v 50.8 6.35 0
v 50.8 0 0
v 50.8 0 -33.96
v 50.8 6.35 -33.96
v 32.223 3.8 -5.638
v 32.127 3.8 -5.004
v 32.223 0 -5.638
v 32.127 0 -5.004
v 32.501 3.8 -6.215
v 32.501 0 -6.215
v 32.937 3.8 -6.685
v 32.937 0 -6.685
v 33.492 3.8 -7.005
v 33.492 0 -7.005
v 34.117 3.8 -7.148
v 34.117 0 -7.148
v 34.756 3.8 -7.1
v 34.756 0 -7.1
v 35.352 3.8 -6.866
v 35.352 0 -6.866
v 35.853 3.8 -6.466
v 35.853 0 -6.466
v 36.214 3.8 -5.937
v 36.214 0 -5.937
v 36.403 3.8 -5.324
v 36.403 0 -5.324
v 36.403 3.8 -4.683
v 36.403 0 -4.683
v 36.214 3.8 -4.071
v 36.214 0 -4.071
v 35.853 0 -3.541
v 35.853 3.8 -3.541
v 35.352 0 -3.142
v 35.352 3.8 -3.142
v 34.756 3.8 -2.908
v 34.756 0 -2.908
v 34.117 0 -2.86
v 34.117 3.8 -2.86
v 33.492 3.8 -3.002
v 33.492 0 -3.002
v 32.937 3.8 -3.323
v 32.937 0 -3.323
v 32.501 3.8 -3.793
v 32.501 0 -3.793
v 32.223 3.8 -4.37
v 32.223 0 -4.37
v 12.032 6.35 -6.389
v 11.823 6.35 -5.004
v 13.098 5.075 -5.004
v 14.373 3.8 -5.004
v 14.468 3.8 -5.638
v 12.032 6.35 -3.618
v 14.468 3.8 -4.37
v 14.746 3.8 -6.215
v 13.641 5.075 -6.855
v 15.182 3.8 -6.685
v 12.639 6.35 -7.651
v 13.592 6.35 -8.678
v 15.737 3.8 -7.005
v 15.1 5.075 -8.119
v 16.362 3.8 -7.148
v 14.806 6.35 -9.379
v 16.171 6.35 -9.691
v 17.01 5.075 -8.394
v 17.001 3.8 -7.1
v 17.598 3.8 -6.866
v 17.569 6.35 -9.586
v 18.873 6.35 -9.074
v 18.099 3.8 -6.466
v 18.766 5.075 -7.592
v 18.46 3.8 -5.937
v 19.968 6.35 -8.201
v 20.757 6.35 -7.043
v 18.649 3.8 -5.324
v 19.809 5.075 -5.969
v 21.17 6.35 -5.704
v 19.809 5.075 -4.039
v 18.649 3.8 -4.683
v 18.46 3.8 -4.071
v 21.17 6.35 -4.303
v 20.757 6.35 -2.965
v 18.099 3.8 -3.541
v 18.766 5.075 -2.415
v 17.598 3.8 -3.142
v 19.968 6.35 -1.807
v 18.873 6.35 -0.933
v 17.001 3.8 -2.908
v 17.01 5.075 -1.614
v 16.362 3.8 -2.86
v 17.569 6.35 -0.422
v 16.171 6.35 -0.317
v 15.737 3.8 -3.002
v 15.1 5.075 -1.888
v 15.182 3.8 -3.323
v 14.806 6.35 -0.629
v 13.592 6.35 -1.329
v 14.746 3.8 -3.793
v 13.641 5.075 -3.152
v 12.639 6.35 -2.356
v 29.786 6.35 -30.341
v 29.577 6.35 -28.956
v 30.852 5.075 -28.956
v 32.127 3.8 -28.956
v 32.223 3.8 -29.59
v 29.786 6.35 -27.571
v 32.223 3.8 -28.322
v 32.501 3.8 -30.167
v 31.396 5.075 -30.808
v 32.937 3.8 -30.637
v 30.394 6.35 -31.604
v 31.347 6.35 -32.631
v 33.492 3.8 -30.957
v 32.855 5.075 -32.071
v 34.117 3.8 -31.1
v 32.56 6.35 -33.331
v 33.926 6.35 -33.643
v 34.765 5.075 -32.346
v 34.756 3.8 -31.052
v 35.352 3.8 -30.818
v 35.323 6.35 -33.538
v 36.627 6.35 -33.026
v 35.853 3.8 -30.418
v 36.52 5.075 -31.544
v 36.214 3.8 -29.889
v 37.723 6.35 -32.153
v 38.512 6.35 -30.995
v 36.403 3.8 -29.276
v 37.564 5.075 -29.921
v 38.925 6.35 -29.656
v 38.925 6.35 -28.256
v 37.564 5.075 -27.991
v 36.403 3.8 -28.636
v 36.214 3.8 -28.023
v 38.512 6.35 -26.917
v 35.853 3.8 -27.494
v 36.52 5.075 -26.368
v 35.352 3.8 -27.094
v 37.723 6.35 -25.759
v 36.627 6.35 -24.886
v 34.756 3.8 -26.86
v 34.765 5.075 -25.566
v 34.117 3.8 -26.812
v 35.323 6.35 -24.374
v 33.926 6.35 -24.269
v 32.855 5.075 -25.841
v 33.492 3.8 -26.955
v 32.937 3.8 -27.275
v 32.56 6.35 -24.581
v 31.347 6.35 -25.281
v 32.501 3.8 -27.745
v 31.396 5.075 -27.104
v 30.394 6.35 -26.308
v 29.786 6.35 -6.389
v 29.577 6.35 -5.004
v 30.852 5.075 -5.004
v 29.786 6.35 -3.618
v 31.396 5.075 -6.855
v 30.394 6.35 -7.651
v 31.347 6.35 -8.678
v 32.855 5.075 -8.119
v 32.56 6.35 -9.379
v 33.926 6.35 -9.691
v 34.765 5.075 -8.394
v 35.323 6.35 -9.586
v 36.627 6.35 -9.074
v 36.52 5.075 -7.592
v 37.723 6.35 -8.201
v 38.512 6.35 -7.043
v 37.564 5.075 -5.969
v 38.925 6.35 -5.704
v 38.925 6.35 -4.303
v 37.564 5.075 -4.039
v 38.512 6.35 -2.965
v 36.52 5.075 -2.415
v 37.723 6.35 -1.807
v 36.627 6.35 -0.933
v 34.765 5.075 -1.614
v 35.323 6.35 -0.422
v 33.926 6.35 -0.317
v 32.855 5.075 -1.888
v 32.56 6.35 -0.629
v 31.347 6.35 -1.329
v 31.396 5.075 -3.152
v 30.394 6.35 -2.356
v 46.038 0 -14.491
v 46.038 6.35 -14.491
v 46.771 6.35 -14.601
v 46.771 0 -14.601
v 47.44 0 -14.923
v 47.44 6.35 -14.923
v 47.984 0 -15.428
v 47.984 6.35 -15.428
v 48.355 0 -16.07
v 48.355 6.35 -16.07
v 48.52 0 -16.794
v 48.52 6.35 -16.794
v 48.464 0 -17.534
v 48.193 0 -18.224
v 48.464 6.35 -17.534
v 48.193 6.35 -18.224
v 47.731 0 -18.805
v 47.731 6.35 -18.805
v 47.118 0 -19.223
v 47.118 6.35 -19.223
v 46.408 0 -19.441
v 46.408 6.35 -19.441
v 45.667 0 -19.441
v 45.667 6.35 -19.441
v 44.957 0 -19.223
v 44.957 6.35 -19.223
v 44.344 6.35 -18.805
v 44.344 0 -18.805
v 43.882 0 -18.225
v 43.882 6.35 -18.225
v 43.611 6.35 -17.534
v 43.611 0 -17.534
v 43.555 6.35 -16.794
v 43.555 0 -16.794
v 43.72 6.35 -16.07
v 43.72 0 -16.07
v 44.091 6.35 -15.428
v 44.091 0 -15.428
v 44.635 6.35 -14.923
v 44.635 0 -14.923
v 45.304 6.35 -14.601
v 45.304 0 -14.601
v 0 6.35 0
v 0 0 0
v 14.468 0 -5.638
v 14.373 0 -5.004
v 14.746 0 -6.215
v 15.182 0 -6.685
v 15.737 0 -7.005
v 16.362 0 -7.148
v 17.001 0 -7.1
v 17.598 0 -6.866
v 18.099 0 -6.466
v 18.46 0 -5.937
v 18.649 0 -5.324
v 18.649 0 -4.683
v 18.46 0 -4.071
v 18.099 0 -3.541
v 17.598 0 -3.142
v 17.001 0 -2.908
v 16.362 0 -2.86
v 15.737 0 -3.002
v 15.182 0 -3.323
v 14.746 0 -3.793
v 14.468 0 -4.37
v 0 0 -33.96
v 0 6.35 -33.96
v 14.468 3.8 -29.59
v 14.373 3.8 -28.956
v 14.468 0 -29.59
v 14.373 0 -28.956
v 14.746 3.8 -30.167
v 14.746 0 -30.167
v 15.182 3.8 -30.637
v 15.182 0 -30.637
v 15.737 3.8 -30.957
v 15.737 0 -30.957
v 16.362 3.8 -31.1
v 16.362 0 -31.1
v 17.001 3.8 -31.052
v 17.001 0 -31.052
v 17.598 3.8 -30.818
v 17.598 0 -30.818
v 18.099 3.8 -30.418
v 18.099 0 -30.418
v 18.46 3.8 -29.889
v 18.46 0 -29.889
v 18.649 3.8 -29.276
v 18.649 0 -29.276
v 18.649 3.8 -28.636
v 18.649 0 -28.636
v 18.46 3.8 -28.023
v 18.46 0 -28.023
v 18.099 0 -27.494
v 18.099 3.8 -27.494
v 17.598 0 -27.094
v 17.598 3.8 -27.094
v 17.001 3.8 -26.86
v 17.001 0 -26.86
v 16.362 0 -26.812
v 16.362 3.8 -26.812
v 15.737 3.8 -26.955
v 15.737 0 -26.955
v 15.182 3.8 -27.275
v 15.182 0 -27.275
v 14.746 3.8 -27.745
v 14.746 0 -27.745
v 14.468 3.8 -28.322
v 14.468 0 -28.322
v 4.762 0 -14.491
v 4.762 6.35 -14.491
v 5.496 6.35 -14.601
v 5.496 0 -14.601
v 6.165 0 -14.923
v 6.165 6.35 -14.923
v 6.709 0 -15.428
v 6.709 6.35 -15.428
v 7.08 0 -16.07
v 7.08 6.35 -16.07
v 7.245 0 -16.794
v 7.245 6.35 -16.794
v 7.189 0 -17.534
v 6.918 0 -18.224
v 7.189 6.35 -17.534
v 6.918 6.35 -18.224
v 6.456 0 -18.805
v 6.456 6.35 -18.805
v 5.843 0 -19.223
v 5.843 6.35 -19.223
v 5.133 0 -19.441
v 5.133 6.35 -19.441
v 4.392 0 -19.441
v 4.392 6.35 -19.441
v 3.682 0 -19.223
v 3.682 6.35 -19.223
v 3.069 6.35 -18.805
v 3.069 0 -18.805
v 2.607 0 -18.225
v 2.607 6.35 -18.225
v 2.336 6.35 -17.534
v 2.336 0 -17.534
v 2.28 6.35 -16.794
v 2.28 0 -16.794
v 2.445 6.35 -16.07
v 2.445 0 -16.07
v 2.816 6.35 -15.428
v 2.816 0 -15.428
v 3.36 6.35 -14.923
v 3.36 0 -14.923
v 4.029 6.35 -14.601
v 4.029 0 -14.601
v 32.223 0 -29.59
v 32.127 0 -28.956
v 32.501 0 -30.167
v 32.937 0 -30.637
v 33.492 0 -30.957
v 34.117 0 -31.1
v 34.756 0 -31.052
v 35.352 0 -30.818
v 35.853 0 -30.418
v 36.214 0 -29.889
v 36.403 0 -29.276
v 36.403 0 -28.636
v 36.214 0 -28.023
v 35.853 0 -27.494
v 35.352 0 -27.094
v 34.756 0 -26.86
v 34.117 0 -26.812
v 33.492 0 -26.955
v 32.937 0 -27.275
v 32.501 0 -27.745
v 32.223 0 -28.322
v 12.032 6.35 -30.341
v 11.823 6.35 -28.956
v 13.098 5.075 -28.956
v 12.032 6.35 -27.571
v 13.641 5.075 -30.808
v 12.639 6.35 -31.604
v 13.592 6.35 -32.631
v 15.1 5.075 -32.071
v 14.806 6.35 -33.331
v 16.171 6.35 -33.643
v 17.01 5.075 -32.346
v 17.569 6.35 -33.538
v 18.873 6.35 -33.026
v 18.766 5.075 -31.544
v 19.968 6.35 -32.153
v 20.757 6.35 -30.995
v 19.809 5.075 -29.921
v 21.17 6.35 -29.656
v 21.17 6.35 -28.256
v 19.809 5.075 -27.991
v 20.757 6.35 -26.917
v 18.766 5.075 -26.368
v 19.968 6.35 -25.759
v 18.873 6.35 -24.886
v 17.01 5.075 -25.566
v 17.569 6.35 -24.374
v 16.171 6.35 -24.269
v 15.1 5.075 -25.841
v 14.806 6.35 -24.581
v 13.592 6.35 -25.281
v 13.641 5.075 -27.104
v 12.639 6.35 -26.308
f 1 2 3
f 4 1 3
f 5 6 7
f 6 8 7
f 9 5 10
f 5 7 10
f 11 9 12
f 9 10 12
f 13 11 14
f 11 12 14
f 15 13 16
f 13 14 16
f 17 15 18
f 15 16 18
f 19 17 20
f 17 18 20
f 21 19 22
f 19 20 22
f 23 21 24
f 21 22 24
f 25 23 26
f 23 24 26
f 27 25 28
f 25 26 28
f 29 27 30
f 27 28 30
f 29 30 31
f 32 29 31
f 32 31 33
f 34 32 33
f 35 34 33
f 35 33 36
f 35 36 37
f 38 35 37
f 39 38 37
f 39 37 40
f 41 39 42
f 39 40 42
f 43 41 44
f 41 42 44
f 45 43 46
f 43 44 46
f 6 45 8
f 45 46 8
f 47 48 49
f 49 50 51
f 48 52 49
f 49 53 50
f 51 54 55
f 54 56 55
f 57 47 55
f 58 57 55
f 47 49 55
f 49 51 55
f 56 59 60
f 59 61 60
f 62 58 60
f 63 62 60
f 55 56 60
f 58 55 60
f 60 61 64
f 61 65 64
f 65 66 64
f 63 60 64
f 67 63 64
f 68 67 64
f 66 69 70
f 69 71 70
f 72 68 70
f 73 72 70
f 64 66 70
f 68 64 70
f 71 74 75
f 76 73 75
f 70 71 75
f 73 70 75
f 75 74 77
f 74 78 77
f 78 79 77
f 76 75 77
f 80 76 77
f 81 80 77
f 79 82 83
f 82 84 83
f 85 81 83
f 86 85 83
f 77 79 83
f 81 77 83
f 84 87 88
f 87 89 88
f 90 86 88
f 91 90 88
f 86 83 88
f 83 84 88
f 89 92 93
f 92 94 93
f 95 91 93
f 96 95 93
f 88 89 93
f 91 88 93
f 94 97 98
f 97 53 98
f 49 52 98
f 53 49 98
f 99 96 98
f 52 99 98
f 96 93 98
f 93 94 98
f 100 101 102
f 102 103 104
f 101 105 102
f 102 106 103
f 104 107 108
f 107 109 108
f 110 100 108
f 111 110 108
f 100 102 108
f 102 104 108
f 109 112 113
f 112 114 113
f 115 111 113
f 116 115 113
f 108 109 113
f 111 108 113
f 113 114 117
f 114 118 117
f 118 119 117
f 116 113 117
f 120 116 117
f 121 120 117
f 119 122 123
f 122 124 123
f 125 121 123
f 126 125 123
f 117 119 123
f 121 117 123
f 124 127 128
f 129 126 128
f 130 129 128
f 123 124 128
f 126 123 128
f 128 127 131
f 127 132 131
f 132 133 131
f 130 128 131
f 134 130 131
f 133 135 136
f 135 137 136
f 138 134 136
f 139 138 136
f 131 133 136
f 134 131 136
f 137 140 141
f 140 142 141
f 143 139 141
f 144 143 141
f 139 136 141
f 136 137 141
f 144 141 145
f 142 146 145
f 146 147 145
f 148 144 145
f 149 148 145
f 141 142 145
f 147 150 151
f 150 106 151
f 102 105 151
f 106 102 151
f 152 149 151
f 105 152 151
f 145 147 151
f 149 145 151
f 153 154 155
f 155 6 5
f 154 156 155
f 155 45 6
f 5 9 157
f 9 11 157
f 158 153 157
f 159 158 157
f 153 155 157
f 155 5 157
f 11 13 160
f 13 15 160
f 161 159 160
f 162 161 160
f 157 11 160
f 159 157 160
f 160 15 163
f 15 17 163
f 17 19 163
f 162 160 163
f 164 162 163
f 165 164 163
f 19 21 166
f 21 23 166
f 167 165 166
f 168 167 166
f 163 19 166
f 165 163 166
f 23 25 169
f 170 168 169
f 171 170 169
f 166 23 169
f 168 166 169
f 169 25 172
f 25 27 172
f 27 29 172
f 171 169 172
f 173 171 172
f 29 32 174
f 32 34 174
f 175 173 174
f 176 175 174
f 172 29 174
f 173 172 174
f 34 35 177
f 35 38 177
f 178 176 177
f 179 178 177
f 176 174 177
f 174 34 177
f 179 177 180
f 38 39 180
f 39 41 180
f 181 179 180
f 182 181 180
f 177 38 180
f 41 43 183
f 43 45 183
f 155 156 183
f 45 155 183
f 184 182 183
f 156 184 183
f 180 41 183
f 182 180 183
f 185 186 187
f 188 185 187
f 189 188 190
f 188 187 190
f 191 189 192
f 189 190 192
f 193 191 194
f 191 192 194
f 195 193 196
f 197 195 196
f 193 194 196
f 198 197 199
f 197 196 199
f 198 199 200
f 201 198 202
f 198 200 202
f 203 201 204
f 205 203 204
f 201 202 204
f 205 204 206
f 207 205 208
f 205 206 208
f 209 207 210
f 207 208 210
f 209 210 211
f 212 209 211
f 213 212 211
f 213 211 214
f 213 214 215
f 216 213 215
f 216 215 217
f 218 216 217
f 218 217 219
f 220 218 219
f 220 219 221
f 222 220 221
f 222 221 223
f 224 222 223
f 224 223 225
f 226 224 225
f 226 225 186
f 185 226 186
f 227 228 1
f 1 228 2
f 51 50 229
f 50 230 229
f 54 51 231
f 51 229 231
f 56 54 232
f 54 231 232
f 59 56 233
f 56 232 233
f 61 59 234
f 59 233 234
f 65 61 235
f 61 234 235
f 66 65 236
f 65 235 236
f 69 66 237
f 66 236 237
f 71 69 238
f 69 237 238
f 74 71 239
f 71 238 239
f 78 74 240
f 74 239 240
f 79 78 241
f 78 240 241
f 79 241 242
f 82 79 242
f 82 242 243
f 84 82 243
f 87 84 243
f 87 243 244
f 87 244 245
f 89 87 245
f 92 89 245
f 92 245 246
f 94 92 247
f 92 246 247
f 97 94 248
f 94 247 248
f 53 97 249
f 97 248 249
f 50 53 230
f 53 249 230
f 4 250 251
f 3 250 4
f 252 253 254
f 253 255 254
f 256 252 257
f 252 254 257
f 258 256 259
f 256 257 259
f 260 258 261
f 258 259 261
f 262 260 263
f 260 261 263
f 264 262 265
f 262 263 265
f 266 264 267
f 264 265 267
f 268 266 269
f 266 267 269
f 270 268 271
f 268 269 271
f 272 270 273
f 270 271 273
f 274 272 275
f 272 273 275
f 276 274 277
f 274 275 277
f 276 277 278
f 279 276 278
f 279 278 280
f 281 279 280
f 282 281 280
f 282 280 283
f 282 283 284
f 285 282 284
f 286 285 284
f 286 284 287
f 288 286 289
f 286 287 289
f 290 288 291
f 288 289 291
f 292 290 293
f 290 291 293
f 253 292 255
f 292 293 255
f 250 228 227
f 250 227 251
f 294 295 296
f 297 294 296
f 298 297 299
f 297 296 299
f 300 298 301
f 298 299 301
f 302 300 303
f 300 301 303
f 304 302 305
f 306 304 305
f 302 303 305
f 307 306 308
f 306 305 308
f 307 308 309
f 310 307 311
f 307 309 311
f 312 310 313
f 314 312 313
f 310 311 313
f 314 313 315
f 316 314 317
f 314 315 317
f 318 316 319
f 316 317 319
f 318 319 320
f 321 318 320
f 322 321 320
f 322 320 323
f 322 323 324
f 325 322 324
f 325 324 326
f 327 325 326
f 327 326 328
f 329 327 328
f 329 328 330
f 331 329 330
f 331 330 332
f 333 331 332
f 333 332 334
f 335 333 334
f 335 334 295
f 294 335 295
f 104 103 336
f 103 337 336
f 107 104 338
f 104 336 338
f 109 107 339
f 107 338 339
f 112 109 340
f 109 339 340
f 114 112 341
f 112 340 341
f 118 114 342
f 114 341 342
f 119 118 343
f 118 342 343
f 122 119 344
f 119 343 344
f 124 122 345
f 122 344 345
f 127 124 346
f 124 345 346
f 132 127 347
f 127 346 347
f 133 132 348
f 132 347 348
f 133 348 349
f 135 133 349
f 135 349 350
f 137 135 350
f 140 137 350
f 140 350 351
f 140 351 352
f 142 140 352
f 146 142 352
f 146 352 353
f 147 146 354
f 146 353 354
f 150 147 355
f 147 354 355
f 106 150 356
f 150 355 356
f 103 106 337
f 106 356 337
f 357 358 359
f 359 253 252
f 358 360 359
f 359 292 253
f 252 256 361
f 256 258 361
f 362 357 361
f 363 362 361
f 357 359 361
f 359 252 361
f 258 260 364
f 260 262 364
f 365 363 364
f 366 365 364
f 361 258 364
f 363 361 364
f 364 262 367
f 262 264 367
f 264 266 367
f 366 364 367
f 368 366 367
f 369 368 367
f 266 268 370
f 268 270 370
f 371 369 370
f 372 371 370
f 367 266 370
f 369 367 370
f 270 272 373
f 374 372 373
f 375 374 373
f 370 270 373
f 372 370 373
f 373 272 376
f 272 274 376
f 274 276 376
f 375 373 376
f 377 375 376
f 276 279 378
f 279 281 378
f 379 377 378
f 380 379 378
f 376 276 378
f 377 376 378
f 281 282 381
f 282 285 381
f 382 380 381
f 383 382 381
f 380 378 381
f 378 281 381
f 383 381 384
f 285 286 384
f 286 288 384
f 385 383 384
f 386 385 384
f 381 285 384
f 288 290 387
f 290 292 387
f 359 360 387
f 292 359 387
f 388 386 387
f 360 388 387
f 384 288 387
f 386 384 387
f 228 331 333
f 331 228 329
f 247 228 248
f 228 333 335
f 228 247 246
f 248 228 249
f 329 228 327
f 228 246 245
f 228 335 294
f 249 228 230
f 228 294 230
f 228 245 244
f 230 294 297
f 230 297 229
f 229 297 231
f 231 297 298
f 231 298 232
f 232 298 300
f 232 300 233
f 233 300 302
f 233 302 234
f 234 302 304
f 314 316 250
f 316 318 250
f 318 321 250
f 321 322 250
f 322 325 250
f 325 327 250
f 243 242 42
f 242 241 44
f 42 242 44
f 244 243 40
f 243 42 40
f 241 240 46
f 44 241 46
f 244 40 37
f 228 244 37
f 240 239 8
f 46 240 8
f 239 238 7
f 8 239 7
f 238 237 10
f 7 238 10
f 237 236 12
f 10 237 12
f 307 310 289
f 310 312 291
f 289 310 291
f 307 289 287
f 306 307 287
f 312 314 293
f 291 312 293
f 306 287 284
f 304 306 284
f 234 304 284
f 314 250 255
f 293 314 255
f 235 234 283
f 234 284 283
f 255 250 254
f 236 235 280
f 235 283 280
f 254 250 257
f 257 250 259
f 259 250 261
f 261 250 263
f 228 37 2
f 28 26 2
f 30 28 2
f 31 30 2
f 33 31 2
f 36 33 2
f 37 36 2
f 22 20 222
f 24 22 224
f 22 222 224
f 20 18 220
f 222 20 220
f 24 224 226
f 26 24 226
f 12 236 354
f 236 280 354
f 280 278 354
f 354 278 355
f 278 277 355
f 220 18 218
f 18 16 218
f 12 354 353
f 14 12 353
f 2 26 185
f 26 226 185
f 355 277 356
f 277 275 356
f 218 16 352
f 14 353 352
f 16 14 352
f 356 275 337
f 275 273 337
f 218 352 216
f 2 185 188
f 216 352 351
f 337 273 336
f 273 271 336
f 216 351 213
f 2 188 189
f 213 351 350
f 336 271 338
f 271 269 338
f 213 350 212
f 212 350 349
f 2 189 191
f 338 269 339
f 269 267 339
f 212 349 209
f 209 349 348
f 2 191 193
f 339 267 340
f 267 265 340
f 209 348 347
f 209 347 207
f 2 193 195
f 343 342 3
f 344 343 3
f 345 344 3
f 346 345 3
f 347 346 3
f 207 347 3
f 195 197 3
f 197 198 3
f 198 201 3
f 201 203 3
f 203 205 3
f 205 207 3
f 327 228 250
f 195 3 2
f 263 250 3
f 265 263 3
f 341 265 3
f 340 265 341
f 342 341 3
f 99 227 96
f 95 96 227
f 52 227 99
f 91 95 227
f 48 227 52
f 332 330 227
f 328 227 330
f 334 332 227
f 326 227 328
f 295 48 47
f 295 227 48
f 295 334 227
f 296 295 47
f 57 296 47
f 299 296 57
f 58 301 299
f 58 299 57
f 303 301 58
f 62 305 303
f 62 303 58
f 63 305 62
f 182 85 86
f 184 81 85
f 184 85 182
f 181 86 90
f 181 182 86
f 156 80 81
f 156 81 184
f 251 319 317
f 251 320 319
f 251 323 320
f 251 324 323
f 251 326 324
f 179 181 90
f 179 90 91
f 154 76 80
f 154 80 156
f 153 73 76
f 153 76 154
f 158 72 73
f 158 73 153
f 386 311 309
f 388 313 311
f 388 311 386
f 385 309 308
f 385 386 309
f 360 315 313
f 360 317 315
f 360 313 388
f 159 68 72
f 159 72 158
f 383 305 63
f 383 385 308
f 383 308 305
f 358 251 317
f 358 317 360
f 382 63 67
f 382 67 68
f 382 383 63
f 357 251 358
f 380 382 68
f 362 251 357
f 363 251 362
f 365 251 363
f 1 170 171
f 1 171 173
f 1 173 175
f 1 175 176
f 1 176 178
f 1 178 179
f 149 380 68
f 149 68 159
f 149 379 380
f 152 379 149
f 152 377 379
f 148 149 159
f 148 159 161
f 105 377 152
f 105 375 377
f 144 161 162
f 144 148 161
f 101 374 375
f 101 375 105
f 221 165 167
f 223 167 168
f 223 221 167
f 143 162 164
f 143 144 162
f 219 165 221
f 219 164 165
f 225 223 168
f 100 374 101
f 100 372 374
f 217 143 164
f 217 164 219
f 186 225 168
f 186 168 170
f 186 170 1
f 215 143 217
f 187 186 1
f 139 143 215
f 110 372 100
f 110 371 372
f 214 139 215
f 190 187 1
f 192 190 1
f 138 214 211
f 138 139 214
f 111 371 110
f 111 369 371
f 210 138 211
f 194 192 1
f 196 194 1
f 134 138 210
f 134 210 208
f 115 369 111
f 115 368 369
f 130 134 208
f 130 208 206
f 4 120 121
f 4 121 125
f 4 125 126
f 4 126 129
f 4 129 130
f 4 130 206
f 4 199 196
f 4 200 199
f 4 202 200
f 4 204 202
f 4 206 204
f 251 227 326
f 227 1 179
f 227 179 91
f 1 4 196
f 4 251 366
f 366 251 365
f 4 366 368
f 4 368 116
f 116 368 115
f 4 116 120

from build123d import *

# Parameters (mm, degrees)
SKETCH1_W                                       = 50.8
SKETCH1_H                                       = 33.9598
BOSS_EXTRUDE1_DEPTH                             = 6.35
SKETCH2_R                                       = 1.905
THROUGH_TO_BEARING_BLOCK_DEPTH                  = 62.434766346
SKETCH3_R                                       = 2.4892
THROUGH_TO_TNUT_DEPTH                           = 62.434766346
CSK_FOR_M4_FLAT_HEAD_MACHINE_SCREW1_D           = 4.3
CSK_FOR_M4_FLAT_HEAD_MACHINE_SCREW1_CSINK_D     = 9.4
CSK_FOR_M4_FLAT_HEAD_MACHINE_SCREW1_CSINK_ANGLE = 90


with BuildPart() as part:
    # Sketch1 → Boss-Extrude1 (new body)
    with BuildSketch(Plane(origin=(0, 0, 0), x_dir=(1, 0, 0), z_dir=(0, 1, 0))):
        with Locations((25.4, 16.9799)):
            Rectangle(SKETCH1_W, SKETCH1_H)
    extrude(amount=BOSS_EXTRUDE1_DEPTH)

    # Sketch2 → through to bearing block (cut, through all)
    with BuildSketch(Plane(origin=(0, 6.35, 0), x_dir=(1, 0, 0), z_dir=(0, 1, 0))):
        with Locations(Location((16.5227, 28.956, 0), (0, 0, 270))):
            Circle(SKETCH2_R)
        with Locations(Location((16.5227, 5.0038, 0), (0, 0, 270))):
            Circle(SKETCH2_R)
        with Locations(Location((34.2773, 28.956, 0), (0, 0, 270))):
            Circle(SKETCH2_R)
        with Locations(Location((34.2773, 5.0038, 0), (0, 0, 270))):
            Circle(SKETCH2_R)
    extrude(amount=-THROUGH_TO_BEARING_BLOCK_DEPTH, mode=Mode.SUBTRACT)

    # Sketch3 → through to tnut (cut, through all)
    with BuildSketch(Plane(origin=(0, 6.35, 0), x_dir=(1, 0, 0), z_dir=(0, 1, 0))):
        with Locations(Location((4.7625, 16.9799, 0), (0, 0, 270))):
            Circle(SKETCH3_R)
        with Locations(Location((46.0375, 16.9799, 0), (0, 0, 270))):
            Circle(SKETCH3_R)
    extrude(amount=-THROUGH_TO_TNUT_DEPTH, mode=Mode.SUBTRACT)

    # CSK for M4 Flat Head Machine Screw1 (through all)
    with Locations(Plane(origin=(0, 6.35, 0), x_dir=(1, 0, 0), z_dir=(0, 1, 0))):
        with Locations((16.5227, 28.956), (16.5227, 5.0038), (34.2773, 5.0038), (34.2773, 28.956)):
            CounterSinkHole(CSK_FOR_M4_FLAT_HEAD_MACHINE_SCREW1_D / 2, CSK_FOR_M4_FLAT_HEAD_MACHINE_SCREW1_CSINK_D / 2, counter_sink_angle=CSK_FOR_M4_FLAT_HEAD_MACHINE_SCREW1_CSINK_ANGLE)


solid = part.part
